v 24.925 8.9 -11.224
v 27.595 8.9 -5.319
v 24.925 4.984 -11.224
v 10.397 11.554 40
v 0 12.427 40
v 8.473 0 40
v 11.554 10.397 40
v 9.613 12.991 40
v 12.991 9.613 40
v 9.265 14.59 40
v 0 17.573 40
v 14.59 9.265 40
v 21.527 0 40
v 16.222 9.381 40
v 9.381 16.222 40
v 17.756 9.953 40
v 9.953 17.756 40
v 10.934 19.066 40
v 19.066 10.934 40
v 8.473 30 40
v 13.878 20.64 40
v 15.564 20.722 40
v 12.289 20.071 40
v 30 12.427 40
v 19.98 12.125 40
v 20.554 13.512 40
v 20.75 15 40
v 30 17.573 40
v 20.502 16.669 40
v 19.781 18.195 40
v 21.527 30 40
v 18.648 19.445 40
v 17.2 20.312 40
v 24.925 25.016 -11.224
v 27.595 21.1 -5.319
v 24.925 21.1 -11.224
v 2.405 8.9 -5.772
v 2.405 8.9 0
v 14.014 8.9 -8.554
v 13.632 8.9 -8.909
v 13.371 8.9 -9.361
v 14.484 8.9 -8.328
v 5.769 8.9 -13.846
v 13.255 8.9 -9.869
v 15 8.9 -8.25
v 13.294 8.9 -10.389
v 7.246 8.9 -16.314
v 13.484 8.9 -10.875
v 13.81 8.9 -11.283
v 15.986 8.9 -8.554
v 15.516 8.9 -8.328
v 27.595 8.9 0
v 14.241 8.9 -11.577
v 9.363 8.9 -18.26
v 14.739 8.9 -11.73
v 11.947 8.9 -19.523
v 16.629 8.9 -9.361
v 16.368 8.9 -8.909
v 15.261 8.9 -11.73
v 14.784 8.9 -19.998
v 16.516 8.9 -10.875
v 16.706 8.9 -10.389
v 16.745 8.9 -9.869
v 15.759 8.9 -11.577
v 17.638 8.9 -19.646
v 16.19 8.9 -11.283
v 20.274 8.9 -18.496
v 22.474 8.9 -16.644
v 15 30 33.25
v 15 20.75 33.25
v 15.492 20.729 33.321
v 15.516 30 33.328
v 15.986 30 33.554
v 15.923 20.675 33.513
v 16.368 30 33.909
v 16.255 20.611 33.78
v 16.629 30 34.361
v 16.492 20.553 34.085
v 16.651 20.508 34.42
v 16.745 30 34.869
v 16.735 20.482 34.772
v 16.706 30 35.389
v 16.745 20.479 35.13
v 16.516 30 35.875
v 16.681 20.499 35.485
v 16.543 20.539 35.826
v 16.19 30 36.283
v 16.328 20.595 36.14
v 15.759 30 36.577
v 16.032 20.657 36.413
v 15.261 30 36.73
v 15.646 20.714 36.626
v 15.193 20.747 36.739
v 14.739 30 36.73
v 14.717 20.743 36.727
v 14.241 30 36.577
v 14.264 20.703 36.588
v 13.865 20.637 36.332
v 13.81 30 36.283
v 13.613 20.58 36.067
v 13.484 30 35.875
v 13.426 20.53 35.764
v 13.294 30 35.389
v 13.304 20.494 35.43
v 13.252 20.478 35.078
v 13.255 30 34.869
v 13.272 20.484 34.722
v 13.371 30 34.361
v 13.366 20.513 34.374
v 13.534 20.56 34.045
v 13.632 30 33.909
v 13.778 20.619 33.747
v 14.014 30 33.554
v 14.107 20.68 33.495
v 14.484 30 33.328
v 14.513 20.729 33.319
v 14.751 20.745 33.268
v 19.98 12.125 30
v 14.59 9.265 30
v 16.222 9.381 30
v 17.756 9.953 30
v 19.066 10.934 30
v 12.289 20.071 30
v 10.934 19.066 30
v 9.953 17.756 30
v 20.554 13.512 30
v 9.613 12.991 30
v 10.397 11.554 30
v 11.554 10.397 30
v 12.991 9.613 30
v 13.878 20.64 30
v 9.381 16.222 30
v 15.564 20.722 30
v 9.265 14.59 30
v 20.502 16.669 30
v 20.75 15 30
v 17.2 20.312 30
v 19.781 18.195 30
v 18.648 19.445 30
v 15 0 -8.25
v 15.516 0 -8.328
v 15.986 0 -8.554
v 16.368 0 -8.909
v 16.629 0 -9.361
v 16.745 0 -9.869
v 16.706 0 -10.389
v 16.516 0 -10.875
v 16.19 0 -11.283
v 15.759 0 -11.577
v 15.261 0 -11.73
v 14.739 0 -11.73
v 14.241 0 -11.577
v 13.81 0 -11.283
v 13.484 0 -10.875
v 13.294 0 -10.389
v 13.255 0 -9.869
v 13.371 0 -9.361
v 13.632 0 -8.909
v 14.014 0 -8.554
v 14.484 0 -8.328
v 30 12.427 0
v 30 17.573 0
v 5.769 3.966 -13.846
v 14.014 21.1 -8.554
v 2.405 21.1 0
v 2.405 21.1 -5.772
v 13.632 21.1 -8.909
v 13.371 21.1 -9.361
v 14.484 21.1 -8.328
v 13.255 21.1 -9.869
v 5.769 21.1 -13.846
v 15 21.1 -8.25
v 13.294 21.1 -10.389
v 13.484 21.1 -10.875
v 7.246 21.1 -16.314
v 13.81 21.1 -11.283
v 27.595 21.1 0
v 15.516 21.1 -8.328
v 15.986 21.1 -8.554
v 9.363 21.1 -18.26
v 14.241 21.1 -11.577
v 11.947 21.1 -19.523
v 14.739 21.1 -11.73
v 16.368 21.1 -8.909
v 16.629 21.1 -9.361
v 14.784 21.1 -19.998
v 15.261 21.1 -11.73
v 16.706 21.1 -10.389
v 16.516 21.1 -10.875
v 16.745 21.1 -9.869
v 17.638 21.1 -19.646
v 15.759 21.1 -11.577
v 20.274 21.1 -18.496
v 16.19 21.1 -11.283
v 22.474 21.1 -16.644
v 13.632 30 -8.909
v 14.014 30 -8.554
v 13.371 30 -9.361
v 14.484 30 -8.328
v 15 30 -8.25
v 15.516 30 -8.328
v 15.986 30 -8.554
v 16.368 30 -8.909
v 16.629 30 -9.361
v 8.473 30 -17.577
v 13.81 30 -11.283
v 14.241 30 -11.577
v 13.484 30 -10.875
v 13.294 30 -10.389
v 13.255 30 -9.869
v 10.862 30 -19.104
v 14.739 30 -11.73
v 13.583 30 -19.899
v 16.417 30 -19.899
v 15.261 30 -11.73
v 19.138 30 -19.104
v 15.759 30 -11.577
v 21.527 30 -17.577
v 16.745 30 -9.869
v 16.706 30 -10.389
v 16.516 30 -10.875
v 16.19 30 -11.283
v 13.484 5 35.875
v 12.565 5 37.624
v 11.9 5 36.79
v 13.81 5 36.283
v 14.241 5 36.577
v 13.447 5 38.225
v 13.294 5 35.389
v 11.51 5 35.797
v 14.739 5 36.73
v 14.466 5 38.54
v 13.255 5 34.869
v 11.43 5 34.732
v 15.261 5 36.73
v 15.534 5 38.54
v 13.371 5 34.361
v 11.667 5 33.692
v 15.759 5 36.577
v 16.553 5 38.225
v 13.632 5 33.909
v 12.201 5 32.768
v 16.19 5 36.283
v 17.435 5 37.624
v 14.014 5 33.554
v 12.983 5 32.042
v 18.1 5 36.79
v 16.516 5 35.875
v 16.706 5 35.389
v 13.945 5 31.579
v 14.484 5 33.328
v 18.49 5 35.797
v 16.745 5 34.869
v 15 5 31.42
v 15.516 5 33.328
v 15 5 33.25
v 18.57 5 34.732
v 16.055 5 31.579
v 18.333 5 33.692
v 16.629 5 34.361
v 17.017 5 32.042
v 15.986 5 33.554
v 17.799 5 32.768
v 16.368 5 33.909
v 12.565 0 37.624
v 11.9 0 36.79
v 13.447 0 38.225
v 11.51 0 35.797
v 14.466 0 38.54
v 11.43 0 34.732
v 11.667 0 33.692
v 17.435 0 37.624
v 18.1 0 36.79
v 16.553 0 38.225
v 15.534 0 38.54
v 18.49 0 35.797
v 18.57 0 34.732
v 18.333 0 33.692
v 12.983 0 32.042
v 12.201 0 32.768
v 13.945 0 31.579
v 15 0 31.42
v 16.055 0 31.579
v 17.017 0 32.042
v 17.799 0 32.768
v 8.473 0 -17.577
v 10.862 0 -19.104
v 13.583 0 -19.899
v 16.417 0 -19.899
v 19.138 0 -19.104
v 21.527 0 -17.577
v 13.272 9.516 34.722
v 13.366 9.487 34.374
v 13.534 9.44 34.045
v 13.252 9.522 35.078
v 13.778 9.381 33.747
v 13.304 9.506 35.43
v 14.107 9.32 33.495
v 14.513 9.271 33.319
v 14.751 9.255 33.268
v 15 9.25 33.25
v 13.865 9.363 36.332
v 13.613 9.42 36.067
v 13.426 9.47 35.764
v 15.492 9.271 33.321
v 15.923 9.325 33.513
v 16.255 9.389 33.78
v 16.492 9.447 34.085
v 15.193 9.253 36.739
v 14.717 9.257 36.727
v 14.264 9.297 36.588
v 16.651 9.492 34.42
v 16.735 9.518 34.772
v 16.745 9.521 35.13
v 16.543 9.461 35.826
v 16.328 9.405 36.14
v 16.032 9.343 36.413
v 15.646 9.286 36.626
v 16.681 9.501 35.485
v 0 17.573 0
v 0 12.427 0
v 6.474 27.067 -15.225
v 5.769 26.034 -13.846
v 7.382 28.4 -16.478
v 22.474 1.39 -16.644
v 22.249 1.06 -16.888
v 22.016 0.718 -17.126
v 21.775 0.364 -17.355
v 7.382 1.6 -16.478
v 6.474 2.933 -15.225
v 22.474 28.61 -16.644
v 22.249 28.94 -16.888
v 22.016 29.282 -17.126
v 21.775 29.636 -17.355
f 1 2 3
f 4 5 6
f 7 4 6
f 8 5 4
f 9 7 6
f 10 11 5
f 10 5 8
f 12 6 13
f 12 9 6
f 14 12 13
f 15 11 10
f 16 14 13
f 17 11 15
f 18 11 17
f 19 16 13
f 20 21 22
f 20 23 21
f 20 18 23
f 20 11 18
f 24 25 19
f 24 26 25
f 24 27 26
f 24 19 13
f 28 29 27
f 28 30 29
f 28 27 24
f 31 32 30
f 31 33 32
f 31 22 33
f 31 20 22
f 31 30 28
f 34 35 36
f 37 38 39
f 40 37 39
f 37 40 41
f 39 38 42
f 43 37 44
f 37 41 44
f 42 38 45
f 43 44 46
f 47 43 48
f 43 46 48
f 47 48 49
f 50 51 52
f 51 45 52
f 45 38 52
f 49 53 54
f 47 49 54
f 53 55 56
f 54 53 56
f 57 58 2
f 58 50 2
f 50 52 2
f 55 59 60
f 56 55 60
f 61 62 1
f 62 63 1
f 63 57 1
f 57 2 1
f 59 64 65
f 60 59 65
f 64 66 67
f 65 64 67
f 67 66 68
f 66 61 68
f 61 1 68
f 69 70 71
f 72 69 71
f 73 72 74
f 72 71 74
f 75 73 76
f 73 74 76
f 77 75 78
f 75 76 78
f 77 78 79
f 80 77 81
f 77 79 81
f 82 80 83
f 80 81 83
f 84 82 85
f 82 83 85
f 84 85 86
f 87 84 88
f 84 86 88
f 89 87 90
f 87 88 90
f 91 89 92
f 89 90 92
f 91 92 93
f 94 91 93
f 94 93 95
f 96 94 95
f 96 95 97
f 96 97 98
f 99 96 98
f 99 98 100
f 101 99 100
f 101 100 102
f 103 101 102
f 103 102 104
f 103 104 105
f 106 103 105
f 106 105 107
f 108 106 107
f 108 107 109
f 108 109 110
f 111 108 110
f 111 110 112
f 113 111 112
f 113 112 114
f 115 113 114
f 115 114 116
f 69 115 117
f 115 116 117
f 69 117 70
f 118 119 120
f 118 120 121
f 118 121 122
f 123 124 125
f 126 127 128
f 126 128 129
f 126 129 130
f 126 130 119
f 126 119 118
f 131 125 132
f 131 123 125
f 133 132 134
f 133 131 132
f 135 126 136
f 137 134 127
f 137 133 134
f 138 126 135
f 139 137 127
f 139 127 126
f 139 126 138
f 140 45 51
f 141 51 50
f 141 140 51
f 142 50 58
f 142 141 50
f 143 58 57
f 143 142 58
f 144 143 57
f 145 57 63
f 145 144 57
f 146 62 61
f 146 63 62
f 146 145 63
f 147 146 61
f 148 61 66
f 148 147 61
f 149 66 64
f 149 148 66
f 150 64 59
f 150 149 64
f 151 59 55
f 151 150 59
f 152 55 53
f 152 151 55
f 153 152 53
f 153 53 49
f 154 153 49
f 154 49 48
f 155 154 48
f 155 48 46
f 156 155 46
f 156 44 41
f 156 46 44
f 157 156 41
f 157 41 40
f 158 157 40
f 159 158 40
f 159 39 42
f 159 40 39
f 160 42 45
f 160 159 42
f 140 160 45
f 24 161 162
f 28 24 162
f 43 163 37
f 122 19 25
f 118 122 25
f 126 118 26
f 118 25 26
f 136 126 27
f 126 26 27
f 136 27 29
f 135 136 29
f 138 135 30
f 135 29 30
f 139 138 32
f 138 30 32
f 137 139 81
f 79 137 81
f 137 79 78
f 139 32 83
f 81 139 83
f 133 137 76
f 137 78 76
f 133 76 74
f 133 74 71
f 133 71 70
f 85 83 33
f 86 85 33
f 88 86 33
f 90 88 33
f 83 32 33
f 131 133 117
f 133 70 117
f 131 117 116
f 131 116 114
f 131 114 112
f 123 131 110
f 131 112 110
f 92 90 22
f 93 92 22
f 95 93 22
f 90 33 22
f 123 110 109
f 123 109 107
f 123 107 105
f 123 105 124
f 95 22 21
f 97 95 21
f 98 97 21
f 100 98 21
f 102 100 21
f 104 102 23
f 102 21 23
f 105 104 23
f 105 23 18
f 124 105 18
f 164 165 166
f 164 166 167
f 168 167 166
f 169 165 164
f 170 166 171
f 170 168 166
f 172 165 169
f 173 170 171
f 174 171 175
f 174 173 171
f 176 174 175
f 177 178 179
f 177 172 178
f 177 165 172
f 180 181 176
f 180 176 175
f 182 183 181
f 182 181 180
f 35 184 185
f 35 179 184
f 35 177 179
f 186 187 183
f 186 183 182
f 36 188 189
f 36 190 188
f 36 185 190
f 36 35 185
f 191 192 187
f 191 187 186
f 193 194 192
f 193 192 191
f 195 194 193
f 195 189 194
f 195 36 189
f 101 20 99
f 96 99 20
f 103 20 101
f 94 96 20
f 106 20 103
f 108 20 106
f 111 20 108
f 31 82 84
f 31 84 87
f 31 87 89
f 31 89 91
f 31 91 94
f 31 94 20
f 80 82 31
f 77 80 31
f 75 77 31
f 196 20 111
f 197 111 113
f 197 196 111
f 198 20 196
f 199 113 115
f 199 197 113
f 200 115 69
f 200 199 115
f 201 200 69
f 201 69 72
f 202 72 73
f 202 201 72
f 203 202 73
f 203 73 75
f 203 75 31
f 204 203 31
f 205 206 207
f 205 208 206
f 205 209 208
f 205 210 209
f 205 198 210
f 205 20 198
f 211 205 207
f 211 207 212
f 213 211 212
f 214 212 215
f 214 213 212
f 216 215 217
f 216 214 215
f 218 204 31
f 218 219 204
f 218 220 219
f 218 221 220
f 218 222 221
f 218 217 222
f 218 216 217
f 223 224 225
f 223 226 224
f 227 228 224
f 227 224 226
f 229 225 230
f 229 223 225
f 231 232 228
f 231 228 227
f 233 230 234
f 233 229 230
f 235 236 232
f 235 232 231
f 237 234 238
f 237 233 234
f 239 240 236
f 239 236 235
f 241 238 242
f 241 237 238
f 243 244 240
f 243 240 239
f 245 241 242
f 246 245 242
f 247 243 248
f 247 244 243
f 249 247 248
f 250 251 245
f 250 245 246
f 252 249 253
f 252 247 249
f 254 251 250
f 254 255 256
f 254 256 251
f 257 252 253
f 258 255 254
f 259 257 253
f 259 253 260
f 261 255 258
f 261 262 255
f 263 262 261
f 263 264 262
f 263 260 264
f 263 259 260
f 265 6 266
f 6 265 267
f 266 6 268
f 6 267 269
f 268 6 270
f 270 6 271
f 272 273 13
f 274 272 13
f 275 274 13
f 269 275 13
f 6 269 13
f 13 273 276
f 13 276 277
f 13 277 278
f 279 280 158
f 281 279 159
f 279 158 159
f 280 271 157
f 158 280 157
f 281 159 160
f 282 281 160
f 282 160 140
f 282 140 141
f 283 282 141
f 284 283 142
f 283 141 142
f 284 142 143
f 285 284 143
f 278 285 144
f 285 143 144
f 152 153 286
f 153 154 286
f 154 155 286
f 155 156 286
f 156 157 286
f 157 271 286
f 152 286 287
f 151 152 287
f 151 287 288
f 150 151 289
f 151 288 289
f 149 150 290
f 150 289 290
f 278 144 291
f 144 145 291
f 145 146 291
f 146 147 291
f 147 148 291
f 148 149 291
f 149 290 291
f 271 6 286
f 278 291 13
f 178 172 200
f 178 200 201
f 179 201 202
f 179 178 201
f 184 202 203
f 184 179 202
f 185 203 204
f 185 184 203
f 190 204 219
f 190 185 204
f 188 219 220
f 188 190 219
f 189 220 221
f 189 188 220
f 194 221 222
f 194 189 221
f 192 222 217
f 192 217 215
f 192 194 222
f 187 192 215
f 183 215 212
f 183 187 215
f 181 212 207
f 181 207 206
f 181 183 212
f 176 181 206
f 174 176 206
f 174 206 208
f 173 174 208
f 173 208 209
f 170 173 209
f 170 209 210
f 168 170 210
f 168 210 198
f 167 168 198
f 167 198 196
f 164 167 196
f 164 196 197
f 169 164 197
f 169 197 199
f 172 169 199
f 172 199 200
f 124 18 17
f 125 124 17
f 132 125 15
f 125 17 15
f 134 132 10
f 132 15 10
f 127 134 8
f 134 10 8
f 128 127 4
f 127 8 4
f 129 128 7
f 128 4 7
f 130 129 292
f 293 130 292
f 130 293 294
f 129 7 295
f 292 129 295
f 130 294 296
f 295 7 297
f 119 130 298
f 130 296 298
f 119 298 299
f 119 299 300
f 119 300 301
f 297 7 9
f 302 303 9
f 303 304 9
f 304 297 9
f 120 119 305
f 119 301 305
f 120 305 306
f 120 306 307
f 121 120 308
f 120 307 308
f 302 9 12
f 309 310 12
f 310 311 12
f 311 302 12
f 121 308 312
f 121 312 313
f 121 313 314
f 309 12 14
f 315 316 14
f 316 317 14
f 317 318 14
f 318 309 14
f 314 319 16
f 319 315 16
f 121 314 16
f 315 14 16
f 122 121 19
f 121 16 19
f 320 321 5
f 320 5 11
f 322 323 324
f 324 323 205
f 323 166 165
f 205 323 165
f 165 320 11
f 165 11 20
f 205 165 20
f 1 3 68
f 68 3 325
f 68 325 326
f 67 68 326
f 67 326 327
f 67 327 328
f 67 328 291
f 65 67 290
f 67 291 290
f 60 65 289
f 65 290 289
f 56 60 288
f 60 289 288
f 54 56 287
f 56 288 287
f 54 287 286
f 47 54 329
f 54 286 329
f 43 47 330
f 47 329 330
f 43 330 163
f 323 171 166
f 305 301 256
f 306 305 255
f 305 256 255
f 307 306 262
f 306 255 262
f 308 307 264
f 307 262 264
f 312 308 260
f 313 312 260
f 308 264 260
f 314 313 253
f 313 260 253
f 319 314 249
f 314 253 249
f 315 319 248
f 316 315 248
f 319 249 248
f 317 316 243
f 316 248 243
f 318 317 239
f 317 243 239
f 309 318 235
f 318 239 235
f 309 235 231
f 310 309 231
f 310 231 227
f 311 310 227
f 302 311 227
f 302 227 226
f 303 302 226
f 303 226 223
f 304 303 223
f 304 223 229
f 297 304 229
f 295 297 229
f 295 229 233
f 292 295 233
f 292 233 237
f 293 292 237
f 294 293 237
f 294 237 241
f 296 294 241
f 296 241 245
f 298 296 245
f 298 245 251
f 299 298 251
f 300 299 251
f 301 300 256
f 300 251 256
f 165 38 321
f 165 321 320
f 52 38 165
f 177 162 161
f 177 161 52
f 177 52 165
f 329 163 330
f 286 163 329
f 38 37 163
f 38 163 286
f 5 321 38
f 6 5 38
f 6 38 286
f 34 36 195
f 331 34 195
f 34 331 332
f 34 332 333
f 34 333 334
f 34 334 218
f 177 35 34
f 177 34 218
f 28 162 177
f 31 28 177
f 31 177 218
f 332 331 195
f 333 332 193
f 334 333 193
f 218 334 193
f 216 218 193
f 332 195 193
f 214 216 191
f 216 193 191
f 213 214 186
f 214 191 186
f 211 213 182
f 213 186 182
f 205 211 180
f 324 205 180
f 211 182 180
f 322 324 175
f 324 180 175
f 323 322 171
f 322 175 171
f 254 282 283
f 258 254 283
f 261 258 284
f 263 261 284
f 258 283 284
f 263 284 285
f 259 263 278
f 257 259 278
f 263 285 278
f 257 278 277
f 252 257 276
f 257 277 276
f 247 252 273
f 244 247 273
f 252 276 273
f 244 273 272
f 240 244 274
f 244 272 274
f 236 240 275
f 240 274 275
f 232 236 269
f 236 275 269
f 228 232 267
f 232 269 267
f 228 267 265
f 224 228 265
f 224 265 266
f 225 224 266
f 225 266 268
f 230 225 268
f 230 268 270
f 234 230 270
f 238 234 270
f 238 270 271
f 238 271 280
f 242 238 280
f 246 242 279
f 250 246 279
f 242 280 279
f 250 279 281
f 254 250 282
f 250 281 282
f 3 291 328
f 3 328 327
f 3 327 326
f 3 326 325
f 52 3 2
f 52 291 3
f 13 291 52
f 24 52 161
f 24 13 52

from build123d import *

# Parameters (mm, degrees)
SKETCH3_W            = 30
SKETCH3_H            = 30
BOSS_EXTRUDE1_DEPTH  = 40
CUT_EXTRUDE1_DEPTH   = 10
SKETCH5_R            = 3.58
CUT_EXTRUDE2_DEPTH   = 5
CUT_EXTRUDE4_START   = -40
CUT_EXTRUDE4_DEPTH   = 99.309518948
MIRROR5_START        = -40
MIRROR5_COPY_1_DEPTH = 99.309518948
SKETCH9_R            = 1.75
BOSS_EXTRUDE2_DEPTH  = 30
CUT_EXTRUDE5_DEPTH   = 30
SKETCH11_W           = 20
SKETCH11_H           = 12.2
CUT_EXTRUDE6_DEPTH   = 44.5
SKETCH15_R           = 1.75
CUT_EXTRUDE8_DEPTH   = 25


with BuildPart() as part:
    # Sketch3 → Boss-Extrude1 (new body)
    with BuildSketch(Plane.XY):
        with Locations((15, 15)):
            Rectangle(SKETCH3_W, SKETCH3_H)
    extrude(amount=BOSS_EXTRUDE1_DEPTH)

    # Sketch4 → Cut-Extrude1 (cut)
    with BuildSketch(Plane.XY.offset(40)):
        with BuildLine():
            ThreePointArc((20.75, 15), (17.200429736, 20.312307312), (10.934136008, 19.065863992))
            Line((10.934136008, 19.065863992), (19.065863992, 10.934136008))
            ThreePointArc((19.065863992, 10.934136008), (20.312307312, 12.799570264), (20.75, 15))
        make_face()
        with BuildLine():
            Line((19.065863992, 10.934136008), (10.934136008, 19.065863992))
            ThreePointArc((10.934136008, 19.065863992), (10.934136008, 10.934136008), (19.065863992, 10.934136008))
        make_face()
    extrude(amount=-CUT_EXTRUDE1_DEPTH, mode=Mode.SUBTRACT)

    # Sketch5 → Cut-Extrude2 (cut)
    with BuildSketch(Plane.XZ):
        with Locations(Location((15, 35, 0), (0, 0, 270))):
            Circle(SKETCH5_R)
    extrude(amount=-CUT_EXTRUDE2_DEPTH, mode=Mode.SUBTRACT)

    # Sketch8 → Cut-Extrude4 (cut)
    with BuildSketch(Plane(origin=(0, 0, 0), x_dir=(-1, 0, 0), z_dir=(0, 0, -1)).offset(CUT_EXTRUDE4_START)):
        Polygon((-77.236567429, -51.703622198), (-30, 17.572977849), (-21.526577959, 30), (25.70998947, 99.276600047), (-112.843210625, 193.749734905), (-215.789767524, 42.769512659), align=None)
    cut_extrude4 = extrude(amount=CUT_EXTRUDE4_DEPTH, mode=Mode.SUBTRACT)

    # Mirror4: Cut-Extrude4 across plane
    add(cut_extrude4.mirror(Plane.ZY.offset(-15)), mode=Mode.SUBTRACT)

    # Mirror5: Cut-Extrude4 across plane
    add(cut_extrude4.mirror(Plane(origin=(0, 15, 0), x_dir=(0, 0, 1), z_dir=(0, -1, 0))), mode=Mode.SUBTRACT)

    # Mirror5 copy 1 sketch → Mirror5 copy 1 (cut)
    with BuildSketch(Plane(origin=(30, 30, 0), x_dir=(1, 0, 0), z_dir=(0, 0, -1)).offset(MIRROR5_START)):
        Polygon((-77.236567429, -51.703622198), (-30, 17.572977849), (-21.526577959, 30), (25.70998947, 99.276600047), (-112.843210625, 193.749734905), (-215.789767524, 42.769512659), align=None)
    extrude(amount=MIRROR5_COPY_1_DEPTH, mode=Mode.SUBTRACT)

    # Sketch9 → Boss-Extrude2 (add)
    with BuildSketch(Plane(origin=(0, 0, 0), x_dir=(1, 0, 0), z_dir=(0, 1, 0))):
        with BuildLine():
            Line((5.769230769, 13.846153846), (0, 0))
            Line((0, 0), (30, 0))
            Line((30, 0), (24.924823528, 11.223878236))
            Line((24.924823528, 11.223878236), (22.474176558, 16.643544594))
            ThreePointArc((22.474176558, 16.643544594), (13.348408887, 19.862669355), (5.769230769, 13.846153846))
        make_face()
        with Locations(Location((15, 10, 0), (0, 0, 270))):
            Circle(SKETCH9_R, mode=Mode.SUBTRACT)
    extrude(amount=BOSS_EXTRUDE2_DEPTH)

    # Sketch10 → Cut-Extrude5 (cut)
    with BuildSketch(Plane.XY):
        Polygon((0, 17.572977849), (8.473422041, 30), (0, 30), align=None)
        Polygon((8.473422041, 0), (0, 0), (0, 12.427022151), align=None)
        Polygon((21.526577959, 0), (30, 12.427022151), (30, 0), align=None)
        Polygon((30, 17.572977849), (21.526577959, 30), (30, 30), align=None)
    extrude(amount=-CUT_EXTRUDE5_DEPTH, mode=Mode.SUBTRACT)

    # Sketch11 → Cut-Extrude6 (cut, symmetric)
    with BuildSketch(Plane(origin=(30, 0, 0), x_dir=(0, 0, -1), z_dir=(1, 0, 0))):
        with Locations((10, 15)):
            Rectangle(SKETCH11_W, SKETCH11_H)
    extrude(amount=CUT_EXTRUDE6_DEPTH, both=True, mode=Mode.SUBTRACT)

    # Sketch15 → Cut-Extrude8 (cut)
    with BuildSketch(Plane.XZ.offset(-5)):
        with Locations(Location((15, 35, 0), (0, 0, 270))):
            Circle(SKETCH15_R)
    extrude(amount=-CUT_EXTRUDE8_DEPTH, mode=Mode.SUBTRACT)


solid = part.part
